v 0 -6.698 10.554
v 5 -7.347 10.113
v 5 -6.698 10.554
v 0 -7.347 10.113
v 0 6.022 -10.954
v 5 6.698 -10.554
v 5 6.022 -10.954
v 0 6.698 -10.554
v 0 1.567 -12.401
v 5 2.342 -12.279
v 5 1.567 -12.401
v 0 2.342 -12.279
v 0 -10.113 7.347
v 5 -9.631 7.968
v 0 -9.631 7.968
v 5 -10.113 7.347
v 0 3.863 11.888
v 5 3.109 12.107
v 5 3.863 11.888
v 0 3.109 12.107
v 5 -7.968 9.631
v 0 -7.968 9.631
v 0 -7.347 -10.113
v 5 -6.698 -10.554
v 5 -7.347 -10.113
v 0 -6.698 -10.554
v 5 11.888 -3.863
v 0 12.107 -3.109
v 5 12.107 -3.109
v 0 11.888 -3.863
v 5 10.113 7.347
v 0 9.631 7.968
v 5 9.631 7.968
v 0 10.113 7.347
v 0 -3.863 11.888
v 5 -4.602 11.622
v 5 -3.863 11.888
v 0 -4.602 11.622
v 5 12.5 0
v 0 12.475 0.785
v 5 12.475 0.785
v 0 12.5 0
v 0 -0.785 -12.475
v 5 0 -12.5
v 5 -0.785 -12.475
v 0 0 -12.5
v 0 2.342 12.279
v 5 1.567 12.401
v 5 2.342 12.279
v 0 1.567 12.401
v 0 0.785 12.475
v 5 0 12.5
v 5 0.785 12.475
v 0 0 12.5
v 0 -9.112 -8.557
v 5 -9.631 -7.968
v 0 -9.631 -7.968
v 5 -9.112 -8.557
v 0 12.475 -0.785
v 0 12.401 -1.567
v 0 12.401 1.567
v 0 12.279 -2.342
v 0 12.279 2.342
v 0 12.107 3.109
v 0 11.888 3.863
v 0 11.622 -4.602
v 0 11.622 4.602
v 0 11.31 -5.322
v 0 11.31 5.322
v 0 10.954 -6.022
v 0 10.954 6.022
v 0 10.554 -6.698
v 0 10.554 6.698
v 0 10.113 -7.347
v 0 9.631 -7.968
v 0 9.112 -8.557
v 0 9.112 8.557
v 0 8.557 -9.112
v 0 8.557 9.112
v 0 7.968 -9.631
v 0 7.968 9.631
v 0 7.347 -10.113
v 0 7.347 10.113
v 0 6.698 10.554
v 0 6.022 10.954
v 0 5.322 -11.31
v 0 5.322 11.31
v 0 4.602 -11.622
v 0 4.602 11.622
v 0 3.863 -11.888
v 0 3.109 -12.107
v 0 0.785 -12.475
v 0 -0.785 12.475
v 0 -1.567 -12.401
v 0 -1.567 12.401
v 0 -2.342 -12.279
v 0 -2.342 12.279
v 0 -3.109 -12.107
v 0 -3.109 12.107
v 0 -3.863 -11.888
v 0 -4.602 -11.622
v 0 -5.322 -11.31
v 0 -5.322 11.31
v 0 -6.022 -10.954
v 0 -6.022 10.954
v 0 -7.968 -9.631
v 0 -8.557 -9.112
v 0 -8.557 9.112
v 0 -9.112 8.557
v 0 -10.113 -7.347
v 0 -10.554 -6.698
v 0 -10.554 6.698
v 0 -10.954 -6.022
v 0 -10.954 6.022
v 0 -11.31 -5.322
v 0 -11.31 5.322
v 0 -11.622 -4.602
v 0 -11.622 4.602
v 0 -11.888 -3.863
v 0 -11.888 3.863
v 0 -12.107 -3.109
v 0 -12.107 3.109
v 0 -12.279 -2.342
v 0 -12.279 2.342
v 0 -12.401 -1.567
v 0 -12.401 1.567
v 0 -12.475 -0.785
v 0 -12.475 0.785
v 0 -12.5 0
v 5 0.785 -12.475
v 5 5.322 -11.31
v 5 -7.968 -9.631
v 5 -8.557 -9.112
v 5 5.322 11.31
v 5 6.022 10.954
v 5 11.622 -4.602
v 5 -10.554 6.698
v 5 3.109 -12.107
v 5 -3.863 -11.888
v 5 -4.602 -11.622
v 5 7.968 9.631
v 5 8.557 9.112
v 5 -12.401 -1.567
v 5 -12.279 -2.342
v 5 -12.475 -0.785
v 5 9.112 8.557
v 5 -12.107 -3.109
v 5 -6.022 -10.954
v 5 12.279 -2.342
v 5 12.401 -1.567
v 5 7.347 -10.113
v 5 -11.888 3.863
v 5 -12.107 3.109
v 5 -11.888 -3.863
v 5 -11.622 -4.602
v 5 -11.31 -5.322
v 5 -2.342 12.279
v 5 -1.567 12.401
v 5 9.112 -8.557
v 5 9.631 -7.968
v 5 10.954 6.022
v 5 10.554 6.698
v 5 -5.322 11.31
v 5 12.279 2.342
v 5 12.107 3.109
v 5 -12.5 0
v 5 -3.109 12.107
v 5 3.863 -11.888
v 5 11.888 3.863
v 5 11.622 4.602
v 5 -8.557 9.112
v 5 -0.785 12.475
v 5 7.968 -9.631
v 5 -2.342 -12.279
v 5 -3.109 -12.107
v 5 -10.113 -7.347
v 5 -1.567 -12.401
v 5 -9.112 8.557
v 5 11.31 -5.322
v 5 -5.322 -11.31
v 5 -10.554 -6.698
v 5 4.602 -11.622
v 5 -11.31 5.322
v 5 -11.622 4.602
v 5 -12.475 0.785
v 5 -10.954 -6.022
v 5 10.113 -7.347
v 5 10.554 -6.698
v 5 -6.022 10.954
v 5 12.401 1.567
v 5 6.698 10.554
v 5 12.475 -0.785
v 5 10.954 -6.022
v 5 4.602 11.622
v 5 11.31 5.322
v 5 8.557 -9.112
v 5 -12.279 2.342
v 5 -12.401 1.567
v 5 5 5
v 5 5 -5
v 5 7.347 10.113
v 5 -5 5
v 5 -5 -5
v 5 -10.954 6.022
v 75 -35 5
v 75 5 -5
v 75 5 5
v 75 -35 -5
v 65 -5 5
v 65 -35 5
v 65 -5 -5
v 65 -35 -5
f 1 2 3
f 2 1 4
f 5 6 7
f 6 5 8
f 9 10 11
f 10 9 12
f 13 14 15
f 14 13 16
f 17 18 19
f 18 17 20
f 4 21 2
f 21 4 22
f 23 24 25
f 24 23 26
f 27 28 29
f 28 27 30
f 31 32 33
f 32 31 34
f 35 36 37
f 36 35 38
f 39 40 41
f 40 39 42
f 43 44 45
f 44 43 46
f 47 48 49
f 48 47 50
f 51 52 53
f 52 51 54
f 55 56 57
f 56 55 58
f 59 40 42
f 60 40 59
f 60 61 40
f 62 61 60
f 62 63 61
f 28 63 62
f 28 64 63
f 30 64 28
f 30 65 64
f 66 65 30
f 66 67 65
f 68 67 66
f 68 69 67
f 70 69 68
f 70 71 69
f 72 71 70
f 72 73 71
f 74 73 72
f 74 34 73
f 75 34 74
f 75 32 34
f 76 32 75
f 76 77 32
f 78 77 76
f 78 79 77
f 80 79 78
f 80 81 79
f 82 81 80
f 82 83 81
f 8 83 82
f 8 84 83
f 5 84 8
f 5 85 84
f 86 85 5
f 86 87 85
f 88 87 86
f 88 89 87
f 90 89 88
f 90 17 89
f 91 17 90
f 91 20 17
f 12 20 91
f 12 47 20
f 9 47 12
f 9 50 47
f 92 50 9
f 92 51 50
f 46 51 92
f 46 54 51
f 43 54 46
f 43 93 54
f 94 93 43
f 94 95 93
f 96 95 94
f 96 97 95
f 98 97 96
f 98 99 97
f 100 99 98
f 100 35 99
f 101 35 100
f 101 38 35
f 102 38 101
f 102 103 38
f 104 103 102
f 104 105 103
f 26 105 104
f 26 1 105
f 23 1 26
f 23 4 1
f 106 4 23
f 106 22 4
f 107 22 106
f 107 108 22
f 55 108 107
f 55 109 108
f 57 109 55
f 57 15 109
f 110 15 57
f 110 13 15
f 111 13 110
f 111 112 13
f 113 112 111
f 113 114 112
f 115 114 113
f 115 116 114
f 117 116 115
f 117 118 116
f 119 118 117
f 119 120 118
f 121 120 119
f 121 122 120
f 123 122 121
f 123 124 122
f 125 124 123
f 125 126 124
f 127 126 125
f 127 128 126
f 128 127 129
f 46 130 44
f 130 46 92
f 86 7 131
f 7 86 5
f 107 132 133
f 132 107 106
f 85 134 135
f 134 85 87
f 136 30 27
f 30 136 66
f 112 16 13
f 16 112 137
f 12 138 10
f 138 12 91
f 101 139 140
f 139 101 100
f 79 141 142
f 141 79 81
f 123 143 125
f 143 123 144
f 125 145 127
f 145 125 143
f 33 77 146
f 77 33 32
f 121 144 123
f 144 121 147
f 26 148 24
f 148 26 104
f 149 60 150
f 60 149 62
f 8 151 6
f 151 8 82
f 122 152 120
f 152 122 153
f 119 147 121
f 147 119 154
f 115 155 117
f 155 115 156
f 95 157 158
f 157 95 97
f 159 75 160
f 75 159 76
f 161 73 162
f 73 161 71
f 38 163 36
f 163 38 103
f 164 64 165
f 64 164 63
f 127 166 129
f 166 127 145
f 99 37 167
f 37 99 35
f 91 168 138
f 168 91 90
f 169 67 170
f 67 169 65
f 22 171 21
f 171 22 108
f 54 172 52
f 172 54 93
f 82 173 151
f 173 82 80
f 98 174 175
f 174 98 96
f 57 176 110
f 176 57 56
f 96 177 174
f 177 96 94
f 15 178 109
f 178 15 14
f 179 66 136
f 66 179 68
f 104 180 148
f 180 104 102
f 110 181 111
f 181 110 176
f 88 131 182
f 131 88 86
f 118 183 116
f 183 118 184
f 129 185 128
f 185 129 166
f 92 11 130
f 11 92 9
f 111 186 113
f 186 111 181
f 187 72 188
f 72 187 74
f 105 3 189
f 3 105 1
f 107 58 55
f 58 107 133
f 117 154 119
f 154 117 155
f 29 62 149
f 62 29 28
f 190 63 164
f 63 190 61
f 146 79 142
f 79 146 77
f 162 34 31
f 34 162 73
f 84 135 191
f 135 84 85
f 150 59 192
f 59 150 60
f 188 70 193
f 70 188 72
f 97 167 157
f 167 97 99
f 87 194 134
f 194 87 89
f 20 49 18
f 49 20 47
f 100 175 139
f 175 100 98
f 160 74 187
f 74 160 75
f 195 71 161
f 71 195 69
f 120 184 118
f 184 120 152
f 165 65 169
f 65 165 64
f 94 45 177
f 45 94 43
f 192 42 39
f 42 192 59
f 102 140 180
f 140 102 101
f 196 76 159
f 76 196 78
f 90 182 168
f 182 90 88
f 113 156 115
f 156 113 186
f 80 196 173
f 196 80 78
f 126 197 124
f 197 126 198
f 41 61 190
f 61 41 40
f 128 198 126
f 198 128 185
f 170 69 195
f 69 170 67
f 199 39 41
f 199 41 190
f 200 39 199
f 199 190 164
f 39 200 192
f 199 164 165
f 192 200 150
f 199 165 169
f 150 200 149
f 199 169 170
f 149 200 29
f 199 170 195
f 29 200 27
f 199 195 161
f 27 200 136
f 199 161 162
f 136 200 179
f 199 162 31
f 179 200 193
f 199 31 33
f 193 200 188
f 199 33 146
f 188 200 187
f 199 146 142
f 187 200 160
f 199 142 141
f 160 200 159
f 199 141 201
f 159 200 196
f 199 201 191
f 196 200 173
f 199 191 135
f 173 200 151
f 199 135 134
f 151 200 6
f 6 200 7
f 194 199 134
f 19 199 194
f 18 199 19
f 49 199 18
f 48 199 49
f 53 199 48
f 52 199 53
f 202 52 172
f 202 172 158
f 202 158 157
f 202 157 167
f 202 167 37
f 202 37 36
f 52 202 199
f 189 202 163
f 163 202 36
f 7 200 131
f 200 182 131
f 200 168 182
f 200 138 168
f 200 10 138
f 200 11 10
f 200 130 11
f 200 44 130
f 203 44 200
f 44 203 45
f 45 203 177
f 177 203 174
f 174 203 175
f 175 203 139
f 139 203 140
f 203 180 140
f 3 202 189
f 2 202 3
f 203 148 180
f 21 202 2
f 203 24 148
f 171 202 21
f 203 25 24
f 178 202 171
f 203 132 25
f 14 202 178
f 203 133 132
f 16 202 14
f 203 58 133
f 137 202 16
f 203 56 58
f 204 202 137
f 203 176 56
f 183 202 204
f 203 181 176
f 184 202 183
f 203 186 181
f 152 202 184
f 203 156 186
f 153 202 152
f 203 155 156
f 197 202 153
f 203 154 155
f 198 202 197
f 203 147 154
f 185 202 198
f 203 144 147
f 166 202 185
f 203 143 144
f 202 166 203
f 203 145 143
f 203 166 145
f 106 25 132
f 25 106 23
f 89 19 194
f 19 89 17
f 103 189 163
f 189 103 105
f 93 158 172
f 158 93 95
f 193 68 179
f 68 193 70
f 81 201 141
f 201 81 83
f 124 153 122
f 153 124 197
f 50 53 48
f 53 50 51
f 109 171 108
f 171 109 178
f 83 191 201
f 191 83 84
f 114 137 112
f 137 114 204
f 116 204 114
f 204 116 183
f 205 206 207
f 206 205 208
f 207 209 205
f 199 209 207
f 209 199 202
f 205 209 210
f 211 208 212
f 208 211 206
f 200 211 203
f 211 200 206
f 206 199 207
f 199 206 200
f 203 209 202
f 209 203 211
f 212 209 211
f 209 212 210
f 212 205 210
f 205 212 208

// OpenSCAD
$fn=100;

module bras()
{
	rotate([0,90,0]) cylinder(d=25,h=5);
	translate([0,-5,-5]) cube([75,10,10]);
	translate([65,-5,5]) rotate([180,0,0]) cube([10,30,10]);

}


bras();
